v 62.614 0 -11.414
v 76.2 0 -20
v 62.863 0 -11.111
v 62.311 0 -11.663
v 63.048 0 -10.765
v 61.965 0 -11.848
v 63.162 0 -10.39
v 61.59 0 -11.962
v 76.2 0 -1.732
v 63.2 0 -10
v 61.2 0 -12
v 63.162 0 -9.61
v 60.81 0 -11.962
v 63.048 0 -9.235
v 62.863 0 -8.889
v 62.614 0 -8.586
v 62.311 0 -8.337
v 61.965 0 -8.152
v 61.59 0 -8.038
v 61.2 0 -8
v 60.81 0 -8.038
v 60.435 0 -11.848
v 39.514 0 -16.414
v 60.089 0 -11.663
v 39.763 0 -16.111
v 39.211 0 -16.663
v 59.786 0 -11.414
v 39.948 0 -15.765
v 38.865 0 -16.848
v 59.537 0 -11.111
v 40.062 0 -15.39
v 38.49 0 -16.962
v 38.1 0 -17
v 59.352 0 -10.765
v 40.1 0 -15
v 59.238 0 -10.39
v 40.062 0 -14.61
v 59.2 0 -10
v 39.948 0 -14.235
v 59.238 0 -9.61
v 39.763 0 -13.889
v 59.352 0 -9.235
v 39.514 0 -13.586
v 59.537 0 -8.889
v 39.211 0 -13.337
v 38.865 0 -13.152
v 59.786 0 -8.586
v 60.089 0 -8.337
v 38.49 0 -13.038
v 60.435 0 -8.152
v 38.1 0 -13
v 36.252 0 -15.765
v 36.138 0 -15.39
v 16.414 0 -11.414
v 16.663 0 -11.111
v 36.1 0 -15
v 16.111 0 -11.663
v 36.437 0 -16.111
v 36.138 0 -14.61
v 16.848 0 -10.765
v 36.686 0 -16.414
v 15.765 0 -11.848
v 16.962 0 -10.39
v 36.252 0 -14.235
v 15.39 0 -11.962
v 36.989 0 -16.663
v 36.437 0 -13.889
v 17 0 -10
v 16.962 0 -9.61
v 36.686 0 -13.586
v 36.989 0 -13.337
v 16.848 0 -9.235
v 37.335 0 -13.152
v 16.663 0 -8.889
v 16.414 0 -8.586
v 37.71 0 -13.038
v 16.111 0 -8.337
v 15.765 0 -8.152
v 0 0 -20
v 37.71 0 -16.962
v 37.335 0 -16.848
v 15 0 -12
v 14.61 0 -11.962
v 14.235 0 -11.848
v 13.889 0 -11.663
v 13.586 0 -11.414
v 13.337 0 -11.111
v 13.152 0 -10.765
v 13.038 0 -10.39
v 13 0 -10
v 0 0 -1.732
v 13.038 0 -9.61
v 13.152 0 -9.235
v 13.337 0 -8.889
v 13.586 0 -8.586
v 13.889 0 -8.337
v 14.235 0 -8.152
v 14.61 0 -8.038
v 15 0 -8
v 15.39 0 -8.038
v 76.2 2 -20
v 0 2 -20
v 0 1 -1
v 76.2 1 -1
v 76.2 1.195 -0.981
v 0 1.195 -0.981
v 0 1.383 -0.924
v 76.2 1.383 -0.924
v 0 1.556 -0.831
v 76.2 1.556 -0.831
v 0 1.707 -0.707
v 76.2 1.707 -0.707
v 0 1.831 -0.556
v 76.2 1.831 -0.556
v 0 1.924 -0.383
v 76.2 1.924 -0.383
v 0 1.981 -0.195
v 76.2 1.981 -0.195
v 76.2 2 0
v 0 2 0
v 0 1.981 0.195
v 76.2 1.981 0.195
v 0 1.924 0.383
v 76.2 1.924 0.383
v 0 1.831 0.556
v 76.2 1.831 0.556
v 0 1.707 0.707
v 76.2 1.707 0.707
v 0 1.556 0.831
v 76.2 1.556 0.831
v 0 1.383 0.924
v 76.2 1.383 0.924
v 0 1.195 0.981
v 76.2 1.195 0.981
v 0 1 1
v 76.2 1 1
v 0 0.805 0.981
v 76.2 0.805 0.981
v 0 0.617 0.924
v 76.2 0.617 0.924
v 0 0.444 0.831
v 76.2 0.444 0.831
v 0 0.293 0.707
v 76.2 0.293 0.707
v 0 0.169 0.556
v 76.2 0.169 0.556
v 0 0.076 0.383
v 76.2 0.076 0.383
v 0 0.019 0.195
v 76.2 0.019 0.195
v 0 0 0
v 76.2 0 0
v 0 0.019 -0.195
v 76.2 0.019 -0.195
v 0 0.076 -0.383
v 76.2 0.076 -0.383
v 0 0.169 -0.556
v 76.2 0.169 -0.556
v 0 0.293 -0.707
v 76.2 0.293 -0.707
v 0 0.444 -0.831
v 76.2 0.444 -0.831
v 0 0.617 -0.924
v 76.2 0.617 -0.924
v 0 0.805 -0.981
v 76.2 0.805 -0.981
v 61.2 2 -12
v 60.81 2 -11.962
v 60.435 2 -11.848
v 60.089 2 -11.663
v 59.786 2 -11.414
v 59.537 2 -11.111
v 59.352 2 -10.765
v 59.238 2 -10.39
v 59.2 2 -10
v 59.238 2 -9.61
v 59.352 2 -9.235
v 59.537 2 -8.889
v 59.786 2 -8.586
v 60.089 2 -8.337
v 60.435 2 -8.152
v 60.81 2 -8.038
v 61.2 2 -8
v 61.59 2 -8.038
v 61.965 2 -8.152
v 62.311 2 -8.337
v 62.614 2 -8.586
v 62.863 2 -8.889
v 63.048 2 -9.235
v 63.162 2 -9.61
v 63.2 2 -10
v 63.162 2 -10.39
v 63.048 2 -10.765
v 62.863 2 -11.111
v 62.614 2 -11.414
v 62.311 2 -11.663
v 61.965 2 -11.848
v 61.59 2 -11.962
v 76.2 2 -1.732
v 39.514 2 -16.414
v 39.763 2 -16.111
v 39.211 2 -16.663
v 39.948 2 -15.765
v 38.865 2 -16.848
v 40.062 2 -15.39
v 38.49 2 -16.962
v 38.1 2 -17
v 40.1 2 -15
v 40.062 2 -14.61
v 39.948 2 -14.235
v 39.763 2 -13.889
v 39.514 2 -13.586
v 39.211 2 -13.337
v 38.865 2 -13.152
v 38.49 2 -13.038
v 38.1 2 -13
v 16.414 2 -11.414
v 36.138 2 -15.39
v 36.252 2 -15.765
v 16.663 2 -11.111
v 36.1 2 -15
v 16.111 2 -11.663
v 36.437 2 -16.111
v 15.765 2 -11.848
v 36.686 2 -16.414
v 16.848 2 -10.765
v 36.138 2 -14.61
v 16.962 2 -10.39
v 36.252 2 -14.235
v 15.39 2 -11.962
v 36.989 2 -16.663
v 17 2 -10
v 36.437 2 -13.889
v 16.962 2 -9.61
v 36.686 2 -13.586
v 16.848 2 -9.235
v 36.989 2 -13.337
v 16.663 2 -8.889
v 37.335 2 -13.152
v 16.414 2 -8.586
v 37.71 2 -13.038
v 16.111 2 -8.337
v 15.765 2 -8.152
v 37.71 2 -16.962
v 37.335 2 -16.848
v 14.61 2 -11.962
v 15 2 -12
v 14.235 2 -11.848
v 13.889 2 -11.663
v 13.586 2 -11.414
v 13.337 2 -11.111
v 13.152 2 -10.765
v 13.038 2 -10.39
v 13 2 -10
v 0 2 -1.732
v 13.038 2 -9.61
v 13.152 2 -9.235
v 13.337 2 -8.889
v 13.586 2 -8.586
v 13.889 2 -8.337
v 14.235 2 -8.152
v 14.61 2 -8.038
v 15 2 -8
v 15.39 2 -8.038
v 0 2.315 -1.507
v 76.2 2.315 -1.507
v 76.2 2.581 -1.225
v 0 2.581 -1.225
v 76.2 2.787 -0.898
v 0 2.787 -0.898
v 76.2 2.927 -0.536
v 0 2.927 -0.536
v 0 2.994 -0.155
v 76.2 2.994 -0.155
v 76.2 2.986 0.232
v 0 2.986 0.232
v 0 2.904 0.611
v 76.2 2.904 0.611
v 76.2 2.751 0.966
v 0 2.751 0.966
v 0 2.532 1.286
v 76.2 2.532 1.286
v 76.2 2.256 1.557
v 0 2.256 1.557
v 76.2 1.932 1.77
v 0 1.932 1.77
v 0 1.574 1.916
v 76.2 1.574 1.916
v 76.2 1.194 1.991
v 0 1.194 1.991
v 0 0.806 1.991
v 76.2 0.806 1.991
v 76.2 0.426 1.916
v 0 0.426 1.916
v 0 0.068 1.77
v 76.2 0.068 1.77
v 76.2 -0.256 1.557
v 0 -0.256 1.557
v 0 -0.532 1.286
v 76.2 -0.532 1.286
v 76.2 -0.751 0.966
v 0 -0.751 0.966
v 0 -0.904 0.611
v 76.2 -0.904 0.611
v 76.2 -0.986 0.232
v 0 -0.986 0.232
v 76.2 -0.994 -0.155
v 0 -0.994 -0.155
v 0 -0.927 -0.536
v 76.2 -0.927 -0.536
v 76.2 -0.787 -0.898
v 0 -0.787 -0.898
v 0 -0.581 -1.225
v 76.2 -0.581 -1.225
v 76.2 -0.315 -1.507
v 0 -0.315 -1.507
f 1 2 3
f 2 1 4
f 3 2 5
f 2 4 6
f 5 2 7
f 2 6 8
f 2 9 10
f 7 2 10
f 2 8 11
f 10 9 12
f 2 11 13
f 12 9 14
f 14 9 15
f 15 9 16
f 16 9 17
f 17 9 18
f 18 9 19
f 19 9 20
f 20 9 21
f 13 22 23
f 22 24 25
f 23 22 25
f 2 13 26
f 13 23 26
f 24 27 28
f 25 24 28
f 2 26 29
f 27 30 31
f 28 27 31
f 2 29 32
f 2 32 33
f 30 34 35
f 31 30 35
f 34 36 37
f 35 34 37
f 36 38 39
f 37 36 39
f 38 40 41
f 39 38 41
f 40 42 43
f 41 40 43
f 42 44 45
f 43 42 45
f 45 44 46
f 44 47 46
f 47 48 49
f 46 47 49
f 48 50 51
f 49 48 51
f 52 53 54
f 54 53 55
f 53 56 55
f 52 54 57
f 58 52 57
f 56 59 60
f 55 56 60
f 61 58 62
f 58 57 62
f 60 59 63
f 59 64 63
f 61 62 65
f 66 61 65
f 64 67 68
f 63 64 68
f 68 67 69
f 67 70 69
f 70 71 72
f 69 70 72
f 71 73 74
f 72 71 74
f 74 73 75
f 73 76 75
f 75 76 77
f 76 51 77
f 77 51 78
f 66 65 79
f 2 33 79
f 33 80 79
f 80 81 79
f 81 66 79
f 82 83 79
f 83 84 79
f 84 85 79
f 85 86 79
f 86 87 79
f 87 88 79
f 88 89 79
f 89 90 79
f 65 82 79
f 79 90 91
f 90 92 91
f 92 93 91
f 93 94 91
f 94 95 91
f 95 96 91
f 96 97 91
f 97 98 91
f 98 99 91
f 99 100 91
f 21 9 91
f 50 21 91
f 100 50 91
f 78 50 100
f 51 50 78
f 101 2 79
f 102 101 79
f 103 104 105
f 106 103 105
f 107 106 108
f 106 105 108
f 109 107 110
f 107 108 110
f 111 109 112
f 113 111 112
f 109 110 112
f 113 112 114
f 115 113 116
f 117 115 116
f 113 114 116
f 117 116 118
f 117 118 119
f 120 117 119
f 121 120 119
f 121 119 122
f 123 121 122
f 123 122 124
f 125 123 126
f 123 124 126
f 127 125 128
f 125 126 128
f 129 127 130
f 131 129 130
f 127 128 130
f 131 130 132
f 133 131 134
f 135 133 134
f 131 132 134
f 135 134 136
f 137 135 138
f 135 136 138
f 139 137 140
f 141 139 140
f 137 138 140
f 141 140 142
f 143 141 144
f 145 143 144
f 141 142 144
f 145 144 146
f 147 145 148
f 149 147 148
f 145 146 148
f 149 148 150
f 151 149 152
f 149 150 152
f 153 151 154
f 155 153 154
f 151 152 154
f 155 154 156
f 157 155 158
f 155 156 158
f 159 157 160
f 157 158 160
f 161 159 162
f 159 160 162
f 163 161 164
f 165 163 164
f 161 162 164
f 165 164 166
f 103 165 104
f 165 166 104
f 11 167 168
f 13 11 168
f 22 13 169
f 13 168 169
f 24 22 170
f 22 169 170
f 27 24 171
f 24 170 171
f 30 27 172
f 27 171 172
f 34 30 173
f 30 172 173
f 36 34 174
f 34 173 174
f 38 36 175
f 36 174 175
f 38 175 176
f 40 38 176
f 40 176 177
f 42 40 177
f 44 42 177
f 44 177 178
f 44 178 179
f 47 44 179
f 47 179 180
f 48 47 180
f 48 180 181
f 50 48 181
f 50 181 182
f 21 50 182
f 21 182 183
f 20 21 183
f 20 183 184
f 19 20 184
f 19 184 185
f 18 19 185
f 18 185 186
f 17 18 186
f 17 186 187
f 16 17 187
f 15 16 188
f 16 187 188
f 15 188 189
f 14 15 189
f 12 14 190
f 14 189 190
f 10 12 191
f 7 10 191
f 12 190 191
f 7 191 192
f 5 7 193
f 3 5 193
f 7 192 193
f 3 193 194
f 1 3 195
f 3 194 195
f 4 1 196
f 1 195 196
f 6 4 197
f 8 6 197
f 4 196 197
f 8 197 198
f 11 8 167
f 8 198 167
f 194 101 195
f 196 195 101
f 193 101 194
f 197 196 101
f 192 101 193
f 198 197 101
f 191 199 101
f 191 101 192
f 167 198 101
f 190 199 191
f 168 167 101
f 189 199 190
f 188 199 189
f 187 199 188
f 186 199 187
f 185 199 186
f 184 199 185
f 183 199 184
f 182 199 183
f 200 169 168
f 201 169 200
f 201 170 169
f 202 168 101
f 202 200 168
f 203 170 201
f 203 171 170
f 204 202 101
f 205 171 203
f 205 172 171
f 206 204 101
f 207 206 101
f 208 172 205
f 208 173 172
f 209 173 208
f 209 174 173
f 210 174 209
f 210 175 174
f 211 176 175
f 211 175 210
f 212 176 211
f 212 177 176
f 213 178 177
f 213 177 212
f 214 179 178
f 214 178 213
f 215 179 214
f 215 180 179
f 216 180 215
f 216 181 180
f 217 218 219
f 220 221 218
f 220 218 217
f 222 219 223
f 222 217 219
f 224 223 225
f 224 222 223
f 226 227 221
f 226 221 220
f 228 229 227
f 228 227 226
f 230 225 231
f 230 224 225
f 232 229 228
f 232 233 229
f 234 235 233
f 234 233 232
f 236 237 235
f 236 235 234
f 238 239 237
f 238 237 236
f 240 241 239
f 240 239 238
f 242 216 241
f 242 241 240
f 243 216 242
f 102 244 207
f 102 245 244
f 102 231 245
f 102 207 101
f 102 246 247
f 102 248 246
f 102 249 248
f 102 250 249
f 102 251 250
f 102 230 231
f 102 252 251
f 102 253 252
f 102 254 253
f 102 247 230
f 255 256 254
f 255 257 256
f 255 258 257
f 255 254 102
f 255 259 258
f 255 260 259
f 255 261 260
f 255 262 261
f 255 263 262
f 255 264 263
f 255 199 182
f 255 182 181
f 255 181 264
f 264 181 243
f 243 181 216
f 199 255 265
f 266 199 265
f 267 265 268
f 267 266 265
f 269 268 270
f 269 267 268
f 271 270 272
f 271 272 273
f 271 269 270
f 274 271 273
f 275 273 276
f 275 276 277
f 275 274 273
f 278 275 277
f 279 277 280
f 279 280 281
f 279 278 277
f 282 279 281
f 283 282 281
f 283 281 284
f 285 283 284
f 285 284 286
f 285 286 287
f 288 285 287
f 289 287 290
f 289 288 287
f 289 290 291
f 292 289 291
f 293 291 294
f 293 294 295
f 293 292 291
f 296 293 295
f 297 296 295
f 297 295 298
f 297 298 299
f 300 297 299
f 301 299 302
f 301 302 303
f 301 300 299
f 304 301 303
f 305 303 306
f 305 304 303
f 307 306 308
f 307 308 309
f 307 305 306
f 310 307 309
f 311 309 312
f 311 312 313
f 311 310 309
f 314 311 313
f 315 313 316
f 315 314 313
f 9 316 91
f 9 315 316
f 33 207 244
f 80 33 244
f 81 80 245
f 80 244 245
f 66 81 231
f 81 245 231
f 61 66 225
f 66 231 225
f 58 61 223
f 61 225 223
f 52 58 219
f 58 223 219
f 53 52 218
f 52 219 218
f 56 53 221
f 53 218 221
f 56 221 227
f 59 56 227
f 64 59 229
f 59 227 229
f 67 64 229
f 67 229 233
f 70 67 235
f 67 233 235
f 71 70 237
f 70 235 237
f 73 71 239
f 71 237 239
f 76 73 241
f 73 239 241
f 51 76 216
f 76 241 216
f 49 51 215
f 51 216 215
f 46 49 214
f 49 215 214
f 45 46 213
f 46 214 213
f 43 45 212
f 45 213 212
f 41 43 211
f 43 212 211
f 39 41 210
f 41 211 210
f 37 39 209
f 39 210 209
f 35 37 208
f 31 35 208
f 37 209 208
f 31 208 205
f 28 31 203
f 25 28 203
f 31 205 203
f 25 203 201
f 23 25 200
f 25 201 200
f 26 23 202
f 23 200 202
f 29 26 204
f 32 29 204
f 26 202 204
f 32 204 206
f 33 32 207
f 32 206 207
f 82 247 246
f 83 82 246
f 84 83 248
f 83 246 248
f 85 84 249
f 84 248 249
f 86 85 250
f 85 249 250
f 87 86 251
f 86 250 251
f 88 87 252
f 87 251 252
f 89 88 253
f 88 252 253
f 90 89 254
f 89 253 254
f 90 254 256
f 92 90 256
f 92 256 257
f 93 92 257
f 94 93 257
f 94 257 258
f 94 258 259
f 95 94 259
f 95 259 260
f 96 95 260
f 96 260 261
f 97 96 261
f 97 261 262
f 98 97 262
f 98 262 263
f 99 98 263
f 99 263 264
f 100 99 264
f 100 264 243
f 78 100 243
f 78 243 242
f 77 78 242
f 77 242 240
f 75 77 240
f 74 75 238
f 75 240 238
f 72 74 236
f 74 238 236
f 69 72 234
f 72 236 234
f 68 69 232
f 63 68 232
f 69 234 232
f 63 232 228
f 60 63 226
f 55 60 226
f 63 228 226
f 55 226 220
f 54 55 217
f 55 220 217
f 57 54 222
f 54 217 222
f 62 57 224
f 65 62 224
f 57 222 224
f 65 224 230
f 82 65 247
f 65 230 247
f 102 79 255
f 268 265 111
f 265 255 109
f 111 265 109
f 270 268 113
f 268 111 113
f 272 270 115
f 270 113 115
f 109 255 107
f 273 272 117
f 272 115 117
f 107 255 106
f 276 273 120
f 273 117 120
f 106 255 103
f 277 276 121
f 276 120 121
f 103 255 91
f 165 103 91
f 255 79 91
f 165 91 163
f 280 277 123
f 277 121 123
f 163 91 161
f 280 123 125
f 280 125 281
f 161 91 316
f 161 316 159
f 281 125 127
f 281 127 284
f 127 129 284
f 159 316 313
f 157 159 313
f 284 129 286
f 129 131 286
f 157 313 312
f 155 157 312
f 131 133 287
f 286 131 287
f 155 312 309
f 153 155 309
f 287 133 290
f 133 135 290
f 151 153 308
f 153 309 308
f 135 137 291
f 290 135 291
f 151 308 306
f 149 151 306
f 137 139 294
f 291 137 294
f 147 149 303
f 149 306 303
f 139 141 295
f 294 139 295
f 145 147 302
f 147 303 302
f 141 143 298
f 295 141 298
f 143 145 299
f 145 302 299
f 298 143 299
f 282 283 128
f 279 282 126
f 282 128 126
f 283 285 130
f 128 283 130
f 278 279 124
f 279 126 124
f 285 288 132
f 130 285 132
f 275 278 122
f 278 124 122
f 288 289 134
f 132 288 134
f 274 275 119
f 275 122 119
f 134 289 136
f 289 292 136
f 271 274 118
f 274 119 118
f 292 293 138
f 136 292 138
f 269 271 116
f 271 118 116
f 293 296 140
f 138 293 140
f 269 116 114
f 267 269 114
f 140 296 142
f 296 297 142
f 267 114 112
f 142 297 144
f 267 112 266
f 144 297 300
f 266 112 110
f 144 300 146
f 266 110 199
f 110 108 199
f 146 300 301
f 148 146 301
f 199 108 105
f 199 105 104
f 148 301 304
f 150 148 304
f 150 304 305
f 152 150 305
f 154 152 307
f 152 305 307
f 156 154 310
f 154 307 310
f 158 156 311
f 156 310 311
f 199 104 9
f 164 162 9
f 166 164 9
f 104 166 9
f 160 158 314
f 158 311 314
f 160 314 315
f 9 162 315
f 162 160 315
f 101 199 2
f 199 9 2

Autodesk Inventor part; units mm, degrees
ref_plane "YZ Plane" through (0, 0, 0) normal (1, 0, 0) x (0, 1, 0)
ref_plane "XZ Plane" through (0, 0, 0) normal (0, 1, 0) x (-1, 0, 0)
ref_plane "XY Plane" through (0, 0, 0) normal (0, 0, 1) x (1, 0, 0)
sketch "Sketch1" plane through (0, 0, 0) normal (0, 1, 0) x (-1, 0, 0)
  line L0 (0, 0) -> (-76.2, 0)
  line L1 (-76.2, 0) -> (-76.2, -20)
  line L2 (-76.2, -20) -> (0, -20)
  line L3 (0, -20) -> (0, 0)
  line L4 (0, 0) -> (-76.2, 0)
  line L5 (-76.2, 0) -> (-76.2, -10)
  line L6 (-76.2, -10) -> (0, -10) construction
  line L7 (0, -10) -> (0, 0)
  line L8 (0, -10) -> (-15, -10)
  line L9 (-76.2, -10) -> (-61.2, -10)
  line L10 (-38.1, -10) -> (-38.1, -15)
  dimension "d0" = 20
  dimension "d1" = 76.2
  dimension "d2" = 10
  dimension "d3" = 15
  dimension "d4" = 15
  dimension "d5" = 5
extrude "Extrusion1" add sketch "Sketch1" along normal blind 2
hole "Hole1" at (15, 0, -10) at (38.1, 0, -15) at (61.2, 0, -10) direction (0, 1, 0) diameter 4 depth 10 tip angle 118
sketch "Sketch2" plane through (76.2, 0, 0) normal (1, 0, 0) x (0, 0, -1)
  line L0 (0, 0) -> (0, 1)
  circle A0 centre (0, 1) radius 2
  circle A1 centre (0, 1) radius 1
  dimension "d15" = 1
  dimension "d16" = 4
  dimension "d19" = 2
extrude "Extrusion2" add sketch "Sketch2" against normal blind 76.2
extrude "Extrusion4" cut sketch "Sketch2" against normal blind 76.2 contours A1
properties part number "hinge"
